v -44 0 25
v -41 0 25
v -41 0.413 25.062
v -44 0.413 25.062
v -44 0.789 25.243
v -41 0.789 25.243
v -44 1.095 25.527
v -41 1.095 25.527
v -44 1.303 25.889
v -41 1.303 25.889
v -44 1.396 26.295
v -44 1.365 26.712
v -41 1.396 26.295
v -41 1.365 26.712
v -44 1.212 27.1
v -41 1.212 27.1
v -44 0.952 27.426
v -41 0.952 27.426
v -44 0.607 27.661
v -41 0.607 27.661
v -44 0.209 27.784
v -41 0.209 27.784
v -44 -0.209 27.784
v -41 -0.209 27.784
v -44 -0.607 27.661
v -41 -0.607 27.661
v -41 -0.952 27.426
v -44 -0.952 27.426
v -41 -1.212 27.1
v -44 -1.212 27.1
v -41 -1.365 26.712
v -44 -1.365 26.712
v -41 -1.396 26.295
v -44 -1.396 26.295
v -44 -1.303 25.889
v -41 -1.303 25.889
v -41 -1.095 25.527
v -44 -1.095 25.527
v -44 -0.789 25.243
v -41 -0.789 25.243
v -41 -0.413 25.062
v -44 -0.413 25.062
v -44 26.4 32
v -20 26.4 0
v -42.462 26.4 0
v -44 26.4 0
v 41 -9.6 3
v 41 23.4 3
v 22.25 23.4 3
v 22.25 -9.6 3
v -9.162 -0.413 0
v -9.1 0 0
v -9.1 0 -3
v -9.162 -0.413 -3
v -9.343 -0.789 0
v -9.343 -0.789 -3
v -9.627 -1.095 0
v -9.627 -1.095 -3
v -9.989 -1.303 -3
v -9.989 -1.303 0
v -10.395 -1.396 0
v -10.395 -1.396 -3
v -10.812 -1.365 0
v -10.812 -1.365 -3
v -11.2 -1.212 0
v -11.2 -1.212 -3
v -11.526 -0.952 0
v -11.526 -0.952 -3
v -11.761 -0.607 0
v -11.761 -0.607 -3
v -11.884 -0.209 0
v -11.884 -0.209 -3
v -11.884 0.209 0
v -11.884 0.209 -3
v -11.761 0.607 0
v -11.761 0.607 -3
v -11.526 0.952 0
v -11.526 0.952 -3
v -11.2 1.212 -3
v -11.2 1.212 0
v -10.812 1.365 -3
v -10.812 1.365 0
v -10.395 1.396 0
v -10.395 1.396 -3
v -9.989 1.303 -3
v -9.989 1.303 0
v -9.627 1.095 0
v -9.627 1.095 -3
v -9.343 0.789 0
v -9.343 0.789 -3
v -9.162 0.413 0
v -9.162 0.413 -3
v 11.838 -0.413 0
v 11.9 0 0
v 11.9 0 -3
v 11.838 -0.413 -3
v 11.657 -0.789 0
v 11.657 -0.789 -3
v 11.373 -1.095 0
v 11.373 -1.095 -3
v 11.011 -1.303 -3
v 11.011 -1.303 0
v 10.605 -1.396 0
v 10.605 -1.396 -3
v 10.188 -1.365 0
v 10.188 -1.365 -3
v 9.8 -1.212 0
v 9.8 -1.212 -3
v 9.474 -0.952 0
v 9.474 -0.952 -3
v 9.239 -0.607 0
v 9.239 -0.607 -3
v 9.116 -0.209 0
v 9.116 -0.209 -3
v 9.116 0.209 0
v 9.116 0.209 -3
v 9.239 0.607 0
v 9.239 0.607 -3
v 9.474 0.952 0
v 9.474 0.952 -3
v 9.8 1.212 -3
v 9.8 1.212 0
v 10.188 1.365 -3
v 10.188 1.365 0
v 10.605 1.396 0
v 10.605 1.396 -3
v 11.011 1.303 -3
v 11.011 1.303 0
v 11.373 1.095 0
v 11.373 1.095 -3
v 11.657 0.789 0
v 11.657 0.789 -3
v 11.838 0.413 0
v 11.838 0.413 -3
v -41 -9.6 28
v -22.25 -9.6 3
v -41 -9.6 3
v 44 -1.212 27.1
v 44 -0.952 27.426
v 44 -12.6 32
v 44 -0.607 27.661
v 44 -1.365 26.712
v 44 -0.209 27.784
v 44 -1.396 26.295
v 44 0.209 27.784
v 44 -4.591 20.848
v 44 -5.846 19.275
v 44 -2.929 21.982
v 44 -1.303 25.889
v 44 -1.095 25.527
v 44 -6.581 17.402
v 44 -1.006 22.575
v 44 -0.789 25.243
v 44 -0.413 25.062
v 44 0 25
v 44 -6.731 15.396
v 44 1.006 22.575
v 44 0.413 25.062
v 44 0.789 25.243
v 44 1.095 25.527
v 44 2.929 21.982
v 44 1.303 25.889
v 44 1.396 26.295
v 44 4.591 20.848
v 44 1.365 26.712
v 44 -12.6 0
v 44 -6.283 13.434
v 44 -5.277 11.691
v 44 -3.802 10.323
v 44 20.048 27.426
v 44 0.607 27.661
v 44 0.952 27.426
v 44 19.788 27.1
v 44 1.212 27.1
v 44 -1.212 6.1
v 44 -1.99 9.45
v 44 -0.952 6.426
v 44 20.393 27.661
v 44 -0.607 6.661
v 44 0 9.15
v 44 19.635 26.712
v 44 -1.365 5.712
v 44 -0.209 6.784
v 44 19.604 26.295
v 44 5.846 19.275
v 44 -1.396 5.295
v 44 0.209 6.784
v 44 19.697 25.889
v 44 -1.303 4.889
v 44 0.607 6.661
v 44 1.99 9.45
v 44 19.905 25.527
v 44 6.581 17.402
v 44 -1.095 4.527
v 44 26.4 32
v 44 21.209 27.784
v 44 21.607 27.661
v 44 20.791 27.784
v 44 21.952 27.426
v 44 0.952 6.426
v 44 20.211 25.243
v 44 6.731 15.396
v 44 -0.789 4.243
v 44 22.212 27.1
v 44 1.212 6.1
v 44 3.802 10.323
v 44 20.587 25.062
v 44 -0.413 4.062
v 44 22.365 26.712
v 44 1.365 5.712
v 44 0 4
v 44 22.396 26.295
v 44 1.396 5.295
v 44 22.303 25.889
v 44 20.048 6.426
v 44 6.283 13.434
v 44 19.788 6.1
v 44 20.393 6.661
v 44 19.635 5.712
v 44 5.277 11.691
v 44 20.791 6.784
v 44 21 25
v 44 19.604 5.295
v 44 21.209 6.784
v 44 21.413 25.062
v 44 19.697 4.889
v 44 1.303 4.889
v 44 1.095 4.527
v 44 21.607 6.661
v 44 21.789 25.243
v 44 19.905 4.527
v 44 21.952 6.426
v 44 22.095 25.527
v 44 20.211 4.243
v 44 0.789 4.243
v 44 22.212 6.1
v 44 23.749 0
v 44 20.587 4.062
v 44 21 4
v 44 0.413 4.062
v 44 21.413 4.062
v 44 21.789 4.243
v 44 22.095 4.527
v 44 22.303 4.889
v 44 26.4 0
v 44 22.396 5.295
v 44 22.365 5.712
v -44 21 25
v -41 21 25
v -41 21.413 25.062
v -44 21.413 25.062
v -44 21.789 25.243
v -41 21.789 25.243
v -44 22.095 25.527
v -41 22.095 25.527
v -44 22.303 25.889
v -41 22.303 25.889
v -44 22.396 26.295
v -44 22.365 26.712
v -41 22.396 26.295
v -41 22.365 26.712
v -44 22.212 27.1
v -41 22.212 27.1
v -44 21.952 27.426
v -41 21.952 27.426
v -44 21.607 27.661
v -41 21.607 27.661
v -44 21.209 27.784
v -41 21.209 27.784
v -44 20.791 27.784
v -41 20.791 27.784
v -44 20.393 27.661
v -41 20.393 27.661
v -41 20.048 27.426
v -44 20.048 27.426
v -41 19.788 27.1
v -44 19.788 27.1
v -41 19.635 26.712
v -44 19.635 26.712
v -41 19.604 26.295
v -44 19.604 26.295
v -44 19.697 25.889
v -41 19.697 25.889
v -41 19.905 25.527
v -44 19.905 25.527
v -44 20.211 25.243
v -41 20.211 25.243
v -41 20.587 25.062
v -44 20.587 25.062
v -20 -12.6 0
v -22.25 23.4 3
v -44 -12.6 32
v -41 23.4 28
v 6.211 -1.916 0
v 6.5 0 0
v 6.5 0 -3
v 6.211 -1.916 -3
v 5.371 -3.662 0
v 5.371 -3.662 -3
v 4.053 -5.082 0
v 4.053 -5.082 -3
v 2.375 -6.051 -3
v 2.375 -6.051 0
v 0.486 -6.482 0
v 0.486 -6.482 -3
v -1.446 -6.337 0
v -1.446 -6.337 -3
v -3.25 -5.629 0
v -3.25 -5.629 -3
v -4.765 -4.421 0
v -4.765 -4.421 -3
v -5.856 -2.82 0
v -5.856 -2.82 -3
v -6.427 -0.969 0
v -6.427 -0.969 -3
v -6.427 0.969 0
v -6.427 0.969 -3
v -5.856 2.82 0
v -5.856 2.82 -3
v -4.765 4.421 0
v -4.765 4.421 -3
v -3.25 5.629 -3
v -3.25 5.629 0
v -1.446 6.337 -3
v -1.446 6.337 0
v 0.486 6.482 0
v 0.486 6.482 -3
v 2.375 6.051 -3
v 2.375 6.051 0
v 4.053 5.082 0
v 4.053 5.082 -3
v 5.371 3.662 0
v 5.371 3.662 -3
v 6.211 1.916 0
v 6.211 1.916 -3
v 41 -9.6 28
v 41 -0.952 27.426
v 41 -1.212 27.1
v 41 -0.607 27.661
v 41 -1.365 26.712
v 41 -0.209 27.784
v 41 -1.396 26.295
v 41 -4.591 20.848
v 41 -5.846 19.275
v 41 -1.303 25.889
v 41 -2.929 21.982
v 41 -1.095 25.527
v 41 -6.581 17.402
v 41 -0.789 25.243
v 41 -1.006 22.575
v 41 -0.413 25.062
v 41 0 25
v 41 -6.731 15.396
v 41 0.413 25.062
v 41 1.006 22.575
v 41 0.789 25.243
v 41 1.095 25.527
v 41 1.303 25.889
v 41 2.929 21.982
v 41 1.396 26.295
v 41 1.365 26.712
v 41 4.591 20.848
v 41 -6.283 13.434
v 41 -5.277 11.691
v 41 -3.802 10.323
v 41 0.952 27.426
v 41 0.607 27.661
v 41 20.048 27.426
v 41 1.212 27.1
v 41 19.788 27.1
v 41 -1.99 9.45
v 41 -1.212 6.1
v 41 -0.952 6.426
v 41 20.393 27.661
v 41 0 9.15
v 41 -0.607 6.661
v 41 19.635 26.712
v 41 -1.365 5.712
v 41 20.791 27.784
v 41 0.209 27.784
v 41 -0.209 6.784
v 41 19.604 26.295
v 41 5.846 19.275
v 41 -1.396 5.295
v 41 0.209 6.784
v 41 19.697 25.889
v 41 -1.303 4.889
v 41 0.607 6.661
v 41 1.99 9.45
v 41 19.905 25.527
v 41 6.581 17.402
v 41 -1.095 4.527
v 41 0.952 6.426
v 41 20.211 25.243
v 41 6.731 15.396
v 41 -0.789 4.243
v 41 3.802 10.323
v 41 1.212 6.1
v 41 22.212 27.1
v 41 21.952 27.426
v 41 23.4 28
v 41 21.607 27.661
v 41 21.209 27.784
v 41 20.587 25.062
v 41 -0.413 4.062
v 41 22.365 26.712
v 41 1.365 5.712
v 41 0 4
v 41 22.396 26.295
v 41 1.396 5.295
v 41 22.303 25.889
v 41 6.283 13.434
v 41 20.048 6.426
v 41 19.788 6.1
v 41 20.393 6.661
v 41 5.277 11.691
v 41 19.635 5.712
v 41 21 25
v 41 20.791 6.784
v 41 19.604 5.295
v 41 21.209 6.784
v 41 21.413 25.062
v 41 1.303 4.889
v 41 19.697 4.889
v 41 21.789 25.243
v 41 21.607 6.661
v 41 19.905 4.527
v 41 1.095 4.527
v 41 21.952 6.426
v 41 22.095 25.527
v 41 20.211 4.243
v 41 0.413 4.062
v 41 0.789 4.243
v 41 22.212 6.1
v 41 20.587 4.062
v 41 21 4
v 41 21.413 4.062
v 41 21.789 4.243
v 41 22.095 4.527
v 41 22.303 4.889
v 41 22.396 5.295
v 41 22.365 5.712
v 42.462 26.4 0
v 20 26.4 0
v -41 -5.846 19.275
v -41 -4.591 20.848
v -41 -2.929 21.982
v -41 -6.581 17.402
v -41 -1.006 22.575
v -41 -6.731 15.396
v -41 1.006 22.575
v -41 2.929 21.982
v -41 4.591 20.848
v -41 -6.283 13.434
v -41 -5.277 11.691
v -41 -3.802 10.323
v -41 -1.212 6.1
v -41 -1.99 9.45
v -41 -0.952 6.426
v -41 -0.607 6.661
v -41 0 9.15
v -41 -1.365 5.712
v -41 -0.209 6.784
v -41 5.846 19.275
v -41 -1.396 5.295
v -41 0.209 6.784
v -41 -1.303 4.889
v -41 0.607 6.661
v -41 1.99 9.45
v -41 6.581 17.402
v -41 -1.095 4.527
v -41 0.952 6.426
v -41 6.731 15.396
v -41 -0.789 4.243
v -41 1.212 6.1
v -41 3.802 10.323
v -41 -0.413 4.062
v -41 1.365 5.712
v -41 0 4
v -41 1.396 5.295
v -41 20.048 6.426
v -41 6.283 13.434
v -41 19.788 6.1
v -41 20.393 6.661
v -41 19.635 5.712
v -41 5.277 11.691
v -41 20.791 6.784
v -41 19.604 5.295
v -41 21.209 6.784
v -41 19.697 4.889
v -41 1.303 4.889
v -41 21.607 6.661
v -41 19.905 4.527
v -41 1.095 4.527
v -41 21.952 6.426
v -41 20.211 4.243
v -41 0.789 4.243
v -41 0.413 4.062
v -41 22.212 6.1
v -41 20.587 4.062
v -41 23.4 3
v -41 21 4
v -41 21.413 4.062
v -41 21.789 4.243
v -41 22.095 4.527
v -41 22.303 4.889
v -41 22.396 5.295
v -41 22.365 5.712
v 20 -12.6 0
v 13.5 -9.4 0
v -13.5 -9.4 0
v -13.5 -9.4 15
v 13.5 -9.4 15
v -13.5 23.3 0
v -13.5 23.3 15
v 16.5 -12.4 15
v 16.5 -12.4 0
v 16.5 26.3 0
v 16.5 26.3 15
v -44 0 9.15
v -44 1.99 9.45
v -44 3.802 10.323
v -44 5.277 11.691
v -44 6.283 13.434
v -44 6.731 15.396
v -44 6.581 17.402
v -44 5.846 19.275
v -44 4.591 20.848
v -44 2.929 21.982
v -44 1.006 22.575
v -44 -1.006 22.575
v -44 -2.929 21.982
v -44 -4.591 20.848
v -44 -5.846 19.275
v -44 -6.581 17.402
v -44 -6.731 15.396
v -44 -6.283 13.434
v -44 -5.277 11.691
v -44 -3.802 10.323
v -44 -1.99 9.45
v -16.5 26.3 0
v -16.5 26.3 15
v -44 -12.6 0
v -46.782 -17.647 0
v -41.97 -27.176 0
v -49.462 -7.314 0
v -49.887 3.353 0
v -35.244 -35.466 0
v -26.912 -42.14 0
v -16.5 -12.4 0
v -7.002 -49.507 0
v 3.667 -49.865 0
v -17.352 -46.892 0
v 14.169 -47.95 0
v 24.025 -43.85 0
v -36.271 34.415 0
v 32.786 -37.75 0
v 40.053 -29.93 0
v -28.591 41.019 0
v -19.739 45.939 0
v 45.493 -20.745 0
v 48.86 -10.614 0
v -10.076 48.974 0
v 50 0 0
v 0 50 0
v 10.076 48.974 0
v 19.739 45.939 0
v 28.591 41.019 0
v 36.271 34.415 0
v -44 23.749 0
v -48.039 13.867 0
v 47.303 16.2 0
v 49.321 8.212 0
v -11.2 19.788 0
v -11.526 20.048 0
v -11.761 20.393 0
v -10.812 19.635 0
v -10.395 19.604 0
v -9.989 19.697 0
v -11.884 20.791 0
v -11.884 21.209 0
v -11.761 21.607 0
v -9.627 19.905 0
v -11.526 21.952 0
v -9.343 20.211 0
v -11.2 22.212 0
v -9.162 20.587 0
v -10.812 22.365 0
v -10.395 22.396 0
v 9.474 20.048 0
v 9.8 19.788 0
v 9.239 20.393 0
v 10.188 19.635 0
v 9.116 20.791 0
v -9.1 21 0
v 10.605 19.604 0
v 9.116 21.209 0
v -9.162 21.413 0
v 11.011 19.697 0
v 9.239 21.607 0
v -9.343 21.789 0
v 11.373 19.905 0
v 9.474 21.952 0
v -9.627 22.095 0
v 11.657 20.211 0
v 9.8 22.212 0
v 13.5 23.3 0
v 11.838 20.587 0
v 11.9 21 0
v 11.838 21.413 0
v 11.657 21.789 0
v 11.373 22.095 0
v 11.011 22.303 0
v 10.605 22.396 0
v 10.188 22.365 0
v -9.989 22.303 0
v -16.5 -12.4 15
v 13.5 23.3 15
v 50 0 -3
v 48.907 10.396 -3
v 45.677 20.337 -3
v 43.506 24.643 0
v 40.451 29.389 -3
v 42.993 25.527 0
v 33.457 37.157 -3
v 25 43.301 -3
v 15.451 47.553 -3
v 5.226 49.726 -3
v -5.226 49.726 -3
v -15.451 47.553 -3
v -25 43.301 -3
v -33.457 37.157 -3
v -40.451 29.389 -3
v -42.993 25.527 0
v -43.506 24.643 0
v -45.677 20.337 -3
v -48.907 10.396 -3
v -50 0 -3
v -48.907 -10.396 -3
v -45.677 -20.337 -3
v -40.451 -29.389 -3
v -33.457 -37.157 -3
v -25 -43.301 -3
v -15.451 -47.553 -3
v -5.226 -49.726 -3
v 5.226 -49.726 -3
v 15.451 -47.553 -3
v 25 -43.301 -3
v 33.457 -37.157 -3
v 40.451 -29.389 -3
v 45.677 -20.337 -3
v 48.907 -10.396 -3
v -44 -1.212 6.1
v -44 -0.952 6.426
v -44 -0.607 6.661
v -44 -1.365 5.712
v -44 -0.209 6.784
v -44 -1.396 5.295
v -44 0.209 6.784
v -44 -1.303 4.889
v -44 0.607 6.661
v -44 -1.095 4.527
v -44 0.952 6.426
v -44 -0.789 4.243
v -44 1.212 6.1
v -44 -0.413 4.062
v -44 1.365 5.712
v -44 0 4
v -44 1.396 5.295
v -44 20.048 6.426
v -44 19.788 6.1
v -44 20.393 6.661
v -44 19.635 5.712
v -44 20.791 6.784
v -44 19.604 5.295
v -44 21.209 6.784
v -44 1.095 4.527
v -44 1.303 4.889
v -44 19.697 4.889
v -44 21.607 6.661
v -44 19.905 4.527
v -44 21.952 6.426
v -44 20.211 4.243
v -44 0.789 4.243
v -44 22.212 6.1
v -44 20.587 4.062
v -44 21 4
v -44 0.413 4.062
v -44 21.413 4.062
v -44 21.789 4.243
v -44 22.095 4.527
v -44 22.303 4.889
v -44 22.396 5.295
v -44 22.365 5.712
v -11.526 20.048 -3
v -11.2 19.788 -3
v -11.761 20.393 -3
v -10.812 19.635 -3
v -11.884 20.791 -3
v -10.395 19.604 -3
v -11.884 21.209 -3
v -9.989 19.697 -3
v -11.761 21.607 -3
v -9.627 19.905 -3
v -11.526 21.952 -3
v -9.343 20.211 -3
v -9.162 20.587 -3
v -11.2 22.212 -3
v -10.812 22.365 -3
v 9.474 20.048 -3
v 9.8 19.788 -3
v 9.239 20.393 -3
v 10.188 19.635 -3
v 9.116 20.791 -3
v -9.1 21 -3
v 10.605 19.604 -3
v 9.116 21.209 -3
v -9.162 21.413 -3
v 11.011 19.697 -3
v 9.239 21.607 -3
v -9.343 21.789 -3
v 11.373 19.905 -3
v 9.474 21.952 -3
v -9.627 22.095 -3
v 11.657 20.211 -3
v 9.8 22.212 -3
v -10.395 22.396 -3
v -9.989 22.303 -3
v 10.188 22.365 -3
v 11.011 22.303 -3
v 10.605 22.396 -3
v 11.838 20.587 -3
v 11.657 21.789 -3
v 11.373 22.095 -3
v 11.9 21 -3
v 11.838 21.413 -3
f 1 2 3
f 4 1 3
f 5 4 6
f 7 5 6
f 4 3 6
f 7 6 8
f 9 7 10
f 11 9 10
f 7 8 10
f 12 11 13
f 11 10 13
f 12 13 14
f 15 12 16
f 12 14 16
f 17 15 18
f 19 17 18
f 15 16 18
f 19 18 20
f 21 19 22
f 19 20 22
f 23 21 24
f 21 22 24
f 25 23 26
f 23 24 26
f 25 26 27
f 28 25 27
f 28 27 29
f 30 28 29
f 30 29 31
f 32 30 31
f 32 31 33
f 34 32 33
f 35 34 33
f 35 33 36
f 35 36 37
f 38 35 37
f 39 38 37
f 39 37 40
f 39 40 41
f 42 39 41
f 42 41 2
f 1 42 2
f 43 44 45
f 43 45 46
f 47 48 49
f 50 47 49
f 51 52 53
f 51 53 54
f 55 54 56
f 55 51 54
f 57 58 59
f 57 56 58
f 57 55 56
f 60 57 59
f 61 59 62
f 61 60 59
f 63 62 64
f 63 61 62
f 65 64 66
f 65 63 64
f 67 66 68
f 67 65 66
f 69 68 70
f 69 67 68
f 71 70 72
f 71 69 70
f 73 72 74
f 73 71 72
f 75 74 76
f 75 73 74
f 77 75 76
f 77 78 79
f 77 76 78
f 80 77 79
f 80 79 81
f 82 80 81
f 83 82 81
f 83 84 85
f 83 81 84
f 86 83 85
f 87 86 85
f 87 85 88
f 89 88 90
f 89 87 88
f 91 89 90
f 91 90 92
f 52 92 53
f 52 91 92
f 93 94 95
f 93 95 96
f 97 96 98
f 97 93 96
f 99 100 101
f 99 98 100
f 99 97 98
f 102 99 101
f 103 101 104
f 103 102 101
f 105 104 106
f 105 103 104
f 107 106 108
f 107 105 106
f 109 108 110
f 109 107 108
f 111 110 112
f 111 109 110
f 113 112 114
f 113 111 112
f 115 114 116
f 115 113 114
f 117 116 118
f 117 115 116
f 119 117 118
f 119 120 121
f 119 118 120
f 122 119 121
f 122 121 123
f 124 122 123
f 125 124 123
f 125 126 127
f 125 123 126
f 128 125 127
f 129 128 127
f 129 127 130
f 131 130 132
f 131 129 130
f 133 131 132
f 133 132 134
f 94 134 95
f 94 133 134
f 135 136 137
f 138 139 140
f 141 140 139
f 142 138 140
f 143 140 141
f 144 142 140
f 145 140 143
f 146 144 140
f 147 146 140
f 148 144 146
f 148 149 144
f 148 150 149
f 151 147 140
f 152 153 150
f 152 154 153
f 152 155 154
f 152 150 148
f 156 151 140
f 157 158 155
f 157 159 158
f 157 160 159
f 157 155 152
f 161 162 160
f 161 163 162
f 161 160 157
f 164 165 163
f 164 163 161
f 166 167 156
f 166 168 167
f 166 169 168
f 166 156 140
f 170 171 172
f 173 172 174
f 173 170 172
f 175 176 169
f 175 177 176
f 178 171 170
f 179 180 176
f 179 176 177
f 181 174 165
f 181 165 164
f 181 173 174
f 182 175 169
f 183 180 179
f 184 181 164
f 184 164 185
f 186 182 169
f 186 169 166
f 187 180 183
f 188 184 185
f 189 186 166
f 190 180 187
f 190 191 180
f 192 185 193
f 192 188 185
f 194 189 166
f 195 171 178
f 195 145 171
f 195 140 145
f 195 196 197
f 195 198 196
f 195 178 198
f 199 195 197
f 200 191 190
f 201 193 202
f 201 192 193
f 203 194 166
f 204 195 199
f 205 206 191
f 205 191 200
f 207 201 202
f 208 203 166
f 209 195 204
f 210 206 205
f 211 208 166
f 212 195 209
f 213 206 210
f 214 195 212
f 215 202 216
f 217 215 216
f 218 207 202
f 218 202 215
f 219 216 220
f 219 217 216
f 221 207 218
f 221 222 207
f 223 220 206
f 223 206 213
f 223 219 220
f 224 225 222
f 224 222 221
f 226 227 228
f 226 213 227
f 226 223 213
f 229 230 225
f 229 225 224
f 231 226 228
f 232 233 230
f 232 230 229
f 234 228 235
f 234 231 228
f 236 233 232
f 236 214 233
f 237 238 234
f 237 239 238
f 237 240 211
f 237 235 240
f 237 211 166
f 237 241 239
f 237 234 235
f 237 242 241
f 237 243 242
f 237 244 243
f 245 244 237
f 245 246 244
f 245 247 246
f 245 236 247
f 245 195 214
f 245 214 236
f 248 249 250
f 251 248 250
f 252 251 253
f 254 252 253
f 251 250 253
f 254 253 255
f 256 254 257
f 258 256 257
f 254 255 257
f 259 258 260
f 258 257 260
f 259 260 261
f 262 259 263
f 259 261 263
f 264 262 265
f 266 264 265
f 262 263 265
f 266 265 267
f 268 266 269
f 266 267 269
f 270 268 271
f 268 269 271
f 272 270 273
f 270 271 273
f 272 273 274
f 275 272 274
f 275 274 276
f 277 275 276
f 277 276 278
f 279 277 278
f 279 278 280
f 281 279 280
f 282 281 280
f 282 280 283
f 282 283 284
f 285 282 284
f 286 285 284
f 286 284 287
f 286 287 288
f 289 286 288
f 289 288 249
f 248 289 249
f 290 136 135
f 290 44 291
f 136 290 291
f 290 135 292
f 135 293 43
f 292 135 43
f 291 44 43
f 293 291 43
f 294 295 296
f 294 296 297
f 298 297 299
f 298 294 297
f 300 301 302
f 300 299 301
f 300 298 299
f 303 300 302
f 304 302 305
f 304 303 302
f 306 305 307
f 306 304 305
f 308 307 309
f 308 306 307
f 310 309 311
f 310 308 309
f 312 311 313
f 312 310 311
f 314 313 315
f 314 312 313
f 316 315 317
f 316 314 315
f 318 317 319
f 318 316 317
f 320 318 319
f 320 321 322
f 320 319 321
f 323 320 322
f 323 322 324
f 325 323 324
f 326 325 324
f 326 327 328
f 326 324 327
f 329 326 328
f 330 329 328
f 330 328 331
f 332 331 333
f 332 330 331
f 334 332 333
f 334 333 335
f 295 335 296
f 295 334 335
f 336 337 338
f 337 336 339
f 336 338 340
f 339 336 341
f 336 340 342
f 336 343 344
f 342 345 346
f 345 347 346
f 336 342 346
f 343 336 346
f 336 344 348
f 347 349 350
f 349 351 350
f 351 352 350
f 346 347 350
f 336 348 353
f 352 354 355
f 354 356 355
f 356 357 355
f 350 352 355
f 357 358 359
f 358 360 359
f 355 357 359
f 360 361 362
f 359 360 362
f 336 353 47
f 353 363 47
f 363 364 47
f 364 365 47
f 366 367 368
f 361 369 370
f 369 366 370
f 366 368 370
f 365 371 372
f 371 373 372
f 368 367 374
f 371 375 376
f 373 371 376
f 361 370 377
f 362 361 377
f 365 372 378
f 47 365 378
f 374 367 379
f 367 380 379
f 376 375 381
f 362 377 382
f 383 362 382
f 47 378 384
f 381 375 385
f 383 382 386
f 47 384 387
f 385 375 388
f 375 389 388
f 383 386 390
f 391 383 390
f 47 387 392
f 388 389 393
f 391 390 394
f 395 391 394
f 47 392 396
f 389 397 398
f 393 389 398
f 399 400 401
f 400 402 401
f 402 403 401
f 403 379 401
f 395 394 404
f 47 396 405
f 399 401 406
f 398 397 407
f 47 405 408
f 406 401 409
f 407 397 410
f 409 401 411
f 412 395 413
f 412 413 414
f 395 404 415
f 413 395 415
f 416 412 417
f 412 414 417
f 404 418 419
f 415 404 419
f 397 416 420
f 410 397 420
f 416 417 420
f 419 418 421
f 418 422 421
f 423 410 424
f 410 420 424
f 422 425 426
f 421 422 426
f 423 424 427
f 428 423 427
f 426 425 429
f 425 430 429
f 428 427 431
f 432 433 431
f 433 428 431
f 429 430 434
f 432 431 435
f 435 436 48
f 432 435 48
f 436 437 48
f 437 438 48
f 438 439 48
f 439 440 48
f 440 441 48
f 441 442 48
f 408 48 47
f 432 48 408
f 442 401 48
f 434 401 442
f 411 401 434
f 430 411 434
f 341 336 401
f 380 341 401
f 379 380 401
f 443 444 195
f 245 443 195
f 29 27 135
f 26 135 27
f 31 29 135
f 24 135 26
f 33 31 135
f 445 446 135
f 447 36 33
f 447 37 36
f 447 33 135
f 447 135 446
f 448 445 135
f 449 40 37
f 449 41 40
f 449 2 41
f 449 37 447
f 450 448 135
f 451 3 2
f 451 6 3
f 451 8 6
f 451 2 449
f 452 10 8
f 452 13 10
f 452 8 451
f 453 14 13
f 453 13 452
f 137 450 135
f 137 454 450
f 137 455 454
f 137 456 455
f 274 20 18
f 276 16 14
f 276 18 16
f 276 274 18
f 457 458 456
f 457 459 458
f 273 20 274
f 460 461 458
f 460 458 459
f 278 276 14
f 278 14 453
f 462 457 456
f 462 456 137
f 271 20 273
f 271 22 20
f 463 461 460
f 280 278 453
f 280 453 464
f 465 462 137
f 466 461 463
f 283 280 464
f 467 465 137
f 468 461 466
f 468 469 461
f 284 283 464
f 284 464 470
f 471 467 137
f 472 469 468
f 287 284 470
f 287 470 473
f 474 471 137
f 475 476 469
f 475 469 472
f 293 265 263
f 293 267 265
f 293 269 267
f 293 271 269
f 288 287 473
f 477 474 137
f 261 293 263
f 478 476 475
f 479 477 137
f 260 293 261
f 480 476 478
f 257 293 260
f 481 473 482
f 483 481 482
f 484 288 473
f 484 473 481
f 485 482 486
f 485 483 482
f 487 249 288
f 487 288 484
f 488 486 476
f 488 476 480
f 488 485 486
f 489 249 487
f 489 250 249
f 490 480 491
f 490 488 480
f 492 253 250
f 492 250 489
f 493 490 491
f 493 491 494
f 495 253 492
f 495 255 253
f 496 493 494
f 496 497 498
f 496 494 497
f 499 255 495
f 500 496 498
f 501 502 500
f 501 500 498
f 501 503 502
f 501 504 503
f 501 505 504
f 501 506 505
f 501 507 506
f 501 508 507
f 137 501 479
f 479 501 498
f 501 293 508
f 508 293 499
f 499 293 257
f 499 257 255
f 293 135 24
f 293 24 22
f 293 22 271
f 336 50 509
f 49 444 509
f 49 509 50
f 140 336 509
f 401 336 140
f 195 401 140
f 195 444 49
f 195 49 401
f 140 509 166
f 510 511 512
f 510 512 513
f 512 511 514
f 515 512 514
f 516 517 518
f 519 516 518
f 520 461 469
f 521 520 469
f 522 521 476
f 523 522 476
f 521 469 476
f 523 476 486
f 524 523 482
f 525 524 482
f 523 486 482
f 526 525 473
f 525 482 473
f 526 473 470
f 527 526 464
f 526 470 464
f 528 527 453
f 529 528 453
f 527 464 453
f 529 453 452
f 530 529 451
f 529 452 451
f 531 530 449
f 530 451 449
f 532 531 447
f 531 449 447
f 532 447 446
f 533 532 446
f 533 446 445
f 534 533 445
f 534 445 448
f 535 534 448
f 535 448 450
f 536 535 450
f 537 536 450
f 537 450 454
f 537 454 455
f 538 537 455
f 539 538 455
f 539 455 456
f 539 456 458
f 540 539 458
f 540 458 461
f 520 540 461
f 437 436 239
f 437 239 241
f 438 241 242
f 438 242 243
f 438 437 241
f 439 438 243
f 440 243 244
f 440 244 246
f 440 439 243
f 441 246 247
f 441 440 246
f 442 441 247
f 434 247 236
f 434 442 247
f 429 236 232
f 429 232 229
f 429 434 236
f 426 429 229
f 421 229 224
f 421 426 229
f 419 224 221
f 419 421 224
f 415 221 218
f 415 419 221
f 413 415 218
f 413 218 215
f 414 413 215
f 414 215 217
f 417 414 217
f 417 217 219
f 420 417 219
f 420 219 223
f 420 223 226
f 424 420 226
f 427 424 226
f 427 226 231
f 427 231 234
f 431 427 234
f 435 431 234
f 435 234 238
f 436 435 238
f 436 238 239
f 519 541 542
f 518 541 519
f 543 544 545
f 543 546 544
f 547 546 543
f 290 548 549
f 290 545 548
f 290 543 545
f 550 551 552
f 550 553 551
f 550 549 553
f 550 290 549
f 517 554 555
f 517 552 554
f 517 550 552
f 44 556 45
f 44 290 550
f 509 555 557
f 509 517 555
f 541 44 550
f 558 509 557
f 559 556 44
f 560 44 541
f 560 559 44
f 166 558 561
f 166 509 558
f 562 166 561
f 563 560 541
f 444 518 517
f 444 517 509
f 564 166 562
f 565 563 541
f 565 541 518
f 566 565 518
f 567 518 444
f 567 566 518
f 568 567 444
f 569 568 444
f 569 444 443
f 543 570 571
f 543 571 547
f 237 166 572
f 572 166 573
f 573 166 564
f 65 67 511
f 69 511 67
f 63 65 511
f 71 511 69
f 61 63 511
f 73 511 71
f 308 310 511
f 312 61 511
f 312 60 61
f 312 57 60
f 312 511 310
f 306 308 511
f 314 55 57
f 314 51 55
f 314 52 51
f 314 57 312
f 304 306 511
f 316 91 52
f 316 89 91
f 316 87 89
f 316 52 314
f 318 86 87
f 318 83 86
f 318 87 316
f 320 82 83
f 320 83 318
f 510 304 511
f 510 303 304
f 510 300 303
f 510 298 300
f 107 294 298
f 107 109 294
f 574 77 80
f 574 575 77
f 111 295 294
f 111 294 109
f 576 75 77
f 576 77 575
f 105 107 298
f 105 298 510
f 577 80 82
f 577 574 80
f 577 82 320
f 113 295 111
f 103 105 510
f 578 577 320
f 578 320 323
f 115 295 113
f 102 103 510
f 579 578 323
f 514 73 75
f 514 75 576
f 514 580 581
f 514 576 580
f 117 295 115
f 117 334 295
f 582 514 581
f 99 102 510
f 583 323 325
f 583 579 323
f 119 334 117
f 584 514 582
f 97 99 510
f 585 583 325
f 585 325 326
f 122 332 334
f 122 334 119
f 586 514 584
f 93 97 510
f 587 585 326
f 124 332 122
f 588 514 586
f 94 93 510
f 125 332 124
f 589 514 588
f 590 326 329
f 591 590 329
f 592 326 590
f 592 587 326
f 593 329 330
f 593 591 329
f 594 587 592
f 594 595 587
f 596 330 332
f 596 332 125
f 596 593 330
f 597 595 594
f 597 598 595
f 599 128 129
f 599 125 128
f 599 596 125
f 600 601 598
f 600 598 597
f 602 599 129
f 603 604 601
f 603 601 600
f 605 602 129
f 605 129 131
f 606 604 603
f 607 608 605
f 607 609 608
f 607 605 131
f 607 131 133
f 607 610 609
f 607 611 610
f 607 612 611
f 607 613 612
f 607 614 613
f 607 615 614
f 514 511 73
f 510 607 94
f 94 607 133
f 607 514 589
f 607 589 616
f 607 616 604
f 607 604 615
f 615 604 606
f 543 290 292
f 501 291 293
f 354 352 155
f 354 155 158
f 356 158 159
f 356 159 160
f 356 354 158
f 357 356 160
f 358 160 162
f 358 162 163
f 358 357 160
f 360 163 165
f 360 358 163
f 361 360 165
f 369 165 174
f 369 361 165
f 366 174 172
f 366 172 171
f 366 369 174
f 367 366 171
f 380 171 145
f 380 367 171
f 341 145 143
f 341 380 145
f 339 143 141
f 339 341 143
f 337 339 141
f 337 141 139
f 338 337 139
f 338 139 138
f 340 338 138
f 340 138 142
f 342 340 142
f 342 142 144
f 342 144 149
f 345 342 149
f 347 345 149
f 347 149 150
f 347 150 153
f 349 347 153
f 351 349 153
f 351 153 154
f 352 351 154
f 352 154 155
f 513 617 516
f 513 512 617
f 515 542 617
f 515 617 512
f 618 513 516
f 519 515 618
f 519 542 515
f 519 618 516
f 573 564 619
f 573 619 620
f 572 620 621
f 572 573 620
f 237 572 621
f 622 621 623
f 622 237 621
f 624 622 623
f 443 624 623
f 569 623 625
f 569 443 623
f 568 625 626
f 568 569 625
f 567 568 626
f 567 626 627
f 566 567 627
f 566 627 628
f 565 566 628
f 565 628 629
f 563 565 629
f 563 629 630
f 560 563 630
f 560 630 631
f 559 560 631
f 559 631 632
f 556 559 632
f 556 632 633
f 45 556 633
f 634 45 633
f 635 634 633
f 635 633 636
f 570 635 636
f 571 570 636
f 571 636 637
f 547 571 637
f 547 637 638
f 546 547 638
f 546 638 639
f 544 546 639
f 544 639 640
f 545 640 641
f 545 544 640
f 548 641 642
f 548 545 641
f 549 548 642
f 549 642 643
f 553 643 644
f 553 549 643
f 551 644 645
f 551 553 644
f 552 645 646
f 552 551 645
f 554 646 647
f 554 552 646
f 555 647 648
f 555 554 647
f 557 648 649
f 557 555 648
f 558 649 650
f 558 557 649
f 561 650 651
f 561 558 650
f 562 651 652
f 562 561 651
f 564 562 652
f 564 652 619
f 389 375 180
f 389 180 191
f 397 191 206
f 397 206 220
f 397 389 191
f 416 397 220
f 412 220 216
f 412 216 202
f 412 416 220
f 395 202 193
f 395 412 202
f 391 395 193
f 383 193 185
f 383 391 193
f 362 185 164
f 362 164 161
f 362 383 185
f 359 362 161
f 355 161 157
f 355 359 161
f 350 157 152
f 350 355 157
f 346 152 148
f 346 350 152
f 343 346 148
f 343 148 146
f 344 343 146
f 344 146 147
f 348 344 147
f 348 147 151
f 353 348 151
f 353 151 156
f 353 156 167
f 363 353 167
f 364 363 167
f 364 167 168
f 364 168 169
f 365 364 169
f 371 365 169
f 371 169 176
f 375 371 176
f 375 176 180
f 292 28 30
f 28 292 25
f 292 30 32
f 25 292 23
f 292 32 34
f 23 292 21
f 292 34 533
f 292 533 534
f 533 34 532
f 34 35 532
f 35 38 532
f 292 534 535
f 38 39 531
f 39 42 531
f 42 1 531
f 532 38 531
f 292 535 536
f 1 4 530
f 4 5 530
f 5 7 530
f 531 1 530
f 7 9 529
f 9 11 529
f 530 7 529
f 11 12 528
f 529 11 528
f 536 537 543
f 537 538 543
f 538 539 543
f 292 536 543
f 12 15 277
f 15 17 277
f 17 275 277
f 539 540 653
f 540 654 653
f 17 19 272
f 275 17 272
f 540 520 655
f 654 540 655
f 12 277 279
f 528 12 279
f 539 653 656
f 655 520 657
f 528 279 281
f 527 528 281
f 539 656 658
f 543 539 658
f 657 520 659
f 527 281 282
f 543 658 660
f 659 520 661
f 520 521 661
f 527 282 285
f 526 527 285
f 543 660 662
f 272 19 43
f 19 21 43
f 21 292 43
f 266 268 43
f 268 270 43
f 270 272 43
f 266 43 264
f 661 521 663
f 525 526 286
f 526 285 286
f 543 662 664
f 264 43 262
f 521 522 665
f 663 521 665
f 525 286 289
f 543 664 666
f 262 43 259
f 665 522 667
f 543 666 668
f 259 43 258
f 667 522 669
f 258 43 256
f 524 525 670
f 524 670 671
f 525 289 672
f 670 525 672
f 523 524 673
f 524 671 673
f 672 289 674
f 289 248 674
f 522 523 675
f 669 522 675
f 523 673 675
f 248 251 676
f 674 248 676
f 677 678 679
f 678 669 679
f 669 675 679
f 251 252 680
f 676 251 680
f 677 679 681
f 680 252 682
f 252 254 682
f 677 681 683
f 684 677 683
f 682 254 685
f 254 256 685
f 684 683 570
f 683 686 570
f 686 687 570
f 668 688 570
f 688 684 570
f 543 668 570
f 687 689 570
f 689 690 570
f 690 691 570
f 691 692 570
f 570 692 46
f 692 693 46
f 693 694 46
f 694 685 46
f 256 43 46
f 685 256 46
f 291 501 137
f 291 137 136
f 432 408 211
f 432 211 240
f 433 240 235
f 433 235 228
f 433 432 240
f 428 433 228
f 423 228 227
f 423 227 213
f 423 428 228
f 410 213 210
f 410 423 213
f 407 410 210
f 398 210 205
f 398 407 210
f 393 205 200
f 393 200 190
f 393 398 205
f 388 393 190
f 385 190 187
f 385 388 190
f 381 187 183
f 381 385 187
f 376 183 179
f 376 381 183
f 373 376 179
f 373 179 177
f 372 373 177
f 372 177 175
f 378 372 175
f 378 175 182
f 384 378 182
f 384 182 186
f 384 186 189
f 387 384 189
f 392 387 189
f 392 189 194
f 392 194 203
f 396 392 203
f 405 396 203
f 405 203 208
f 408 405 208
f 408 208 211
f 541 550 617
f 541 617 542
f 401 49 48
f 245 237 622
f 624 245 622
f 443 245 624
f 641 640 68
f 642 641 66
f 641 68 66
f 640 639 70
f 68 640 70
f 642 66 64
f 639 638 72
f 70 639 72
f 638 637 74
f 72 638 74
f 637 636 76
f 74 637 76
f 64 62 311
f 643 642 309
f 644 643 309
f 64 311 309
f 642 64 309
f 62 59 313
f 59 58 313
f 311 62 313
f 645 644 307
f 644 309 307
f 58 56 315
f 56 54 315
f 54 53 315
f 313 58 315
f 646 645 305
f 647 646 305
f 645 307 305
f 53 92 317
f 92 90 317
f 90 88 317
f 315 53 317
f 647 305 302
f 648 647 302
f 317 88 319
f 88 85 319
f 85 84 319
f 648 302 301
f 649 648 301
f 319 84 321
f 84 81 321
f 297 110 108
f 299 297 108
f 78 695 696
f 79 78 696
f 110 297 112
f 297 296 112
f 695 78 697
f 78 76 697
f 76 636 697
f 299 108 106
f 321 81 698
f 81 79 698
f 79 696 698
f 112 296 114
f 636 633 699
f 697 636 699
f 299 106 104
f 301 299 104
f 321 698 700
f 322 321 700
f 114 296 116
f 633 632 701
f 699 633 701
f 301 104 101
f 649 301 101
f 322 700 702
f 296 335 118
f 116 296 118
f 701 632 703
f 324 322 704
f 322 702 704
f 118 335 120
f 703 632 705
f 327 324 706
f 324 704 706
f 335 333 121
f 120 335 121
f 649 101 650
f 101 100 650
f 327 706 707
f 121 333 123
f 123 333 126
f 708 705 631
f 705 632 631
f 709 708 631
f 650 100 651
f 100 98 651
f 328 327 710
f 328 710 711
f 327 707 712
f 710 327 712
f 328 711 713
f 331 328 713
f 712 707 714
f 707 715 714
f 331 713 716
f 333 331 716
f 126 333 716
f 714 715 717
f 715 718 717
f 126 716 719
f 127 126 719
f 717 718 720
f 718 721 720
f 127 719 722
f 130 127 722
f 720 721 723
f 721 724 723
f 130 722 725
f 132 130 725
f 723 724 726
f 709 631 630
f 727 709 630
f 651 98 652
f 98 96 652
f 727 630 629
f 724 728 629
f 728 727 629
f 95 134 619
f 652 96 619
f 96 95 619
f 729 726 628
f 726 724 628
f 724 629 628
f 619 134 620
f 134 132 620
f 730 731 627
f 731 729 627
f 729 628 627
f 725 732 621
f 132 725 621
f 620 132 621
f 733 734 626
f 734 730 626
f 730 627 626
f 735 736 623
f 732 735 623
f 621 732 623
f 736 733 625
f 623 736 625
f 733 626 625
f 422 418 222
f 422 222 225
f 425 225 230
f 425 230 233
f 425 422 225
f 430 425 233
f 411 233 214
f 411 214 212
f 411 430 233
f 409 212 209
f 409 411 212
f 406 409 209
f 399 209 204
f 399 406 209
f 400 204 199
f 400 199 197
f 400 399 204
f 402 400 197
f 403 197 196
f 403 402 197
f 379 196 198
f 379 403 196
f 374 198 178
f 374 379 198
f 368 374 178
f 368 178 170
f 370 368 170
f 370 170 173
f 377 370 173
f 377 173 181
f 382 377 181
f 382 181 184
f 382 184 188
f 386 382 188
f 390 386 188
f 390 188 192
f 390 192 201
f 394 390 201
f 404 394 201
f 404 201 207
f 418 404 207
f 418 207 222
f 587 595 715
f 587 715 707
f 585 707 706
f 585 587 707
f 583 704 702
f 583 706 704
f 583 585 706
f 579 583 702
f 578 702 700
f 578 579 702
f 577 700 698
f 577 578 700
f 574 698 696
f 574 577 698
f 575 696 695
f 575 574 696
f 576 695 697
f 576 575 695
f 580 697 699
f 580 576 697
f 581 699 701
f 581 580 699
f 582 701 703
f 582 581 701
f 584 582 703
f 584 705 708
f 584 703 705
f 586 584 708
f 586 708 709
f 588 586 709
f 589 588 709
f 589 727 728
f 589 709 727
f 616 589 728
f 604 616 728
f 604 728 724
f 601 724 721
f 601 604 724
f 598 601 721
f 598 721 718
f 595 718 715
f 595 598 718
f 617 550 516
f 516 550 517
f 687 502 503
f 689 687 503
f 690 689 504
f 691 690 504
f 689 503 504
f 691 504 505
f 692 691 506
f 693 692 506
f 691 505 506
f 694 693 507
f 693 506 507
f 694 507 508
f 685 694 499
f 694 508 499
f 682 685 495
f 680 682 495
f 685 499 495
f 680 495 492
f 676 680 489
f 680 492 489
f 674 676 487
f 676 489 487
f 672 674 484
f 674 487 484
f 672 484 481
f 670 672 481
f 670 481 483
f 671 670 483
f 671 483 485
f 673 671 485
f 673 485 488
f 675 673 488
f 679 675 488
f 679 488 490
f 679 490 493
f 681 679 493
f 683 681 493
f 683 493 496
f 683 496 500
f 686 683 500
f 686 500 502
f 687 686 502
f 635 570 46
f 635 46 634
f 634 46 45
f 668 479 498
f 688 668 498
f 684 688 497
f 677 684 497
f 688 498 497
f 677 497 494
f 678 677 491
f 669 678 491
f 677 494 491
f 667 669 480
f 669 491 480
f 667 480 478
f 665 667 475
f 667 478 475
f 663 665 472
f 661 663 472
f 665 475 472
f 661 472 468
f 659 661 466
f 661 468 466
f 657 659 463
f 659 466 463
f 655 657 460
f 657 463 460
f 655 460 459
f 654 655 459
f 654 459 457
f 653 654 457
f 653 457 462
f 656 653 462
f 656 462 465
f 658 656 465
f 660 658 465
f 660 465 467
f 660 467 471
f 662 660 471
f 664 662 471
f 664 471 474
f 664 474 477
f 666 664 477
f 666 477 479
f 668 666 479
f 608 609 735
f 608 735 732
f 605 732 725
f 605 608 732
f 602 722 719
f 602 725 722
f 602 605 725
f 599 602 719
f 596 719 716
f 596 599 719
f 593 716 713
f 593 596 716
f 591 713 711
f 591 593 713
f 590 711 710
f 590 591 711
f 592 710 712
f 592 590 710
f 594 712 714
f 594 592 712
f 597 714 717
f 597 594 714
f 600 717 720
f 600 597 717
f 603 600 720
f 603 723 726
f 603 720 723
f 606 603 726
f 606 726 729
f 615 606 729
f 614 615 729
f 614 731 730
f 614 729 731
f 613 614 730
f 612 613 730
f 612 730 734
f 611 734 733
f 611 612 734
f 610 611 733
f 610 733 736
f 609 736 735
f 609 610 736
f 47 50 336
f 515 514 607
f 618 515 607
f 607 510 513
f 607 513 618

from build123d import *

# Parameters (mm, degrees)
EXTRUDE_START            = 26.4
EXTRUDE_3_DEPTH          = 39
SHELL_2_T                = -3
SKETCH_7_R               = 6.75
SKETCH_7_R_2             = 1.4
CUT_EXTRUDE_5_DEPTH      = 47.496881616
SKETCH_1_R               = 50
EXTRUDE_1_DEPTH          = 3
SKETCH_9_W               = 33
SKETCH_9_H               = 38.7
SKETCH_9_W_2             = 27
SKETCH_9_H_2             = 32.7
EXTRUDE_5_DEPTH          = 15
CUT_EXTRUDE_8_DEPTH      = 79.89866919
CUT_EXTRUDE_8_DEPTH_BACK = 79.89866919
SKETCH_8_R               = 1.4
SKETCH_8_R_2             = 6.5


# Read off the part's stored shape, not the designer's step: ﾐﾗｰ1
with BuildPart() as part:
    # ｽｹｯﾁ5 → ﾎﾞｽ - 押し出し3 (new body)
    with BuildSketch(Plane(origin=(0, 0, 0), x_dir=(1, 0, 0), z_dir=(0, 1, 0)).offset(EXTRUDE_START)):
        Polygon((-44, -32), (-44, 0), (-20, 0), align=None)
    extrude(amount=-EXTRUDE_3_DEPTH)

    # ｼｪﾙ2
    shell_2_openings = [part.faces().sort_by_distance(p)[0] for p in [
        (-32, 6.9, 16),
    ]]
    offset(amount=SHELL_2_T, openings=shell_2_openings, kind=Kind.INTERSECTION)

    # ｽｹｯﾁ7 → ｶｯﾄ - 押し出し5 (cut, through all)
    with BuildSketch(Plane(origin=(-41, 0, 0), x_dir=(0, 0, -1), z_dir=(1, 0, 0))):
        with Locations((-15.9, 0)):
            Circle(SKETCH_7_R)
        with Locations((-26.4, 0)):
            Circle(SKETCH_7_R_2)
        with Locations((-5.4, 0)):
            Circle(SKETCH_7_R_2)
        with Locations((-5.4, 21)):
            Circle(SKETCH_7_R_2)
        with Locations((-26.4, 21)):
            Circle(SKETCH_7_R_2)
    extrude(amount=-CUT_EXTRUDE_5_DEPTH, mode=Mode.SUBTRACT)

    # ｽｹｯﾁ1 → ﾎﾞｽ - 押し出し1 (add)
    with BuildSketch(Plane.XY):
        Circle(SKETCH_1_R)
    extrude(amount=-EXTRUDE_1_DEPTH)

    # ﾐﾗｰ1: part across plane


with BuildPart() as part_1:
    add(part.part)
    add(part.part.mirror(Plane(origin=(0, 0, 0), x_dir=(0, 0, 1), z_dir=(1, 0, 0))))

    # ｽｹｯﾁ9 → ﾎﾞｽ - 押し出し5 (add)
    with BuildSketch(Plane.XY):
        with Locations((0, 6.95)):
            Rectangle(SKETCH_9_W, SKETCH_9_H)
        with Locations((0, 6.95)):
            Rectangle(SKETCH_9_W_2, SKETCH_9_H_2, mode=Mode.SUBTRACT)
    extrude(amount=EXTRUDE_5_DEPTH)

    # ｽｹｯﾁ8 → ｶｯﾄ - 押し出し8 (cut, two sides: drawn at the far end of the back side and taken through both)
    with BuildSketch(Plane(origin=(0, 0, -3), x_dir=(-1, 0, 0), z_dir=(0, 0, -1)).offset(-CUT_EXTRUDE_8_DEPTH_BACK)):
        with Locations(Location((-10.5, 21, 0), (0, 0, 180))):
            Circle(SKETCH_8_R)
        with Locations(Location((10.5, 21, 0), (0, 0, 180))):
            Circle(SKETCH_8_R)
        with Locations(Location((-10.5, 0, 0), (0, 0, 180))):
            Circle(SKETCH_8_R)
        with Locations(Location((10.5, 0, 0), (0, 0, 180))):
            Circle(SKETCH_8_R)
        with Locations(Location((0, 0, 0), (0, 0, 180))):
            Circle(SKETCH_8_R_2)
    extrude(amount=CUT_EXTRUDE_8_DEPTH + CUT_EXTRUDE_8_DEPTH_BACK, mode=Mode.SUBTRACT)


solid = part_1.part
